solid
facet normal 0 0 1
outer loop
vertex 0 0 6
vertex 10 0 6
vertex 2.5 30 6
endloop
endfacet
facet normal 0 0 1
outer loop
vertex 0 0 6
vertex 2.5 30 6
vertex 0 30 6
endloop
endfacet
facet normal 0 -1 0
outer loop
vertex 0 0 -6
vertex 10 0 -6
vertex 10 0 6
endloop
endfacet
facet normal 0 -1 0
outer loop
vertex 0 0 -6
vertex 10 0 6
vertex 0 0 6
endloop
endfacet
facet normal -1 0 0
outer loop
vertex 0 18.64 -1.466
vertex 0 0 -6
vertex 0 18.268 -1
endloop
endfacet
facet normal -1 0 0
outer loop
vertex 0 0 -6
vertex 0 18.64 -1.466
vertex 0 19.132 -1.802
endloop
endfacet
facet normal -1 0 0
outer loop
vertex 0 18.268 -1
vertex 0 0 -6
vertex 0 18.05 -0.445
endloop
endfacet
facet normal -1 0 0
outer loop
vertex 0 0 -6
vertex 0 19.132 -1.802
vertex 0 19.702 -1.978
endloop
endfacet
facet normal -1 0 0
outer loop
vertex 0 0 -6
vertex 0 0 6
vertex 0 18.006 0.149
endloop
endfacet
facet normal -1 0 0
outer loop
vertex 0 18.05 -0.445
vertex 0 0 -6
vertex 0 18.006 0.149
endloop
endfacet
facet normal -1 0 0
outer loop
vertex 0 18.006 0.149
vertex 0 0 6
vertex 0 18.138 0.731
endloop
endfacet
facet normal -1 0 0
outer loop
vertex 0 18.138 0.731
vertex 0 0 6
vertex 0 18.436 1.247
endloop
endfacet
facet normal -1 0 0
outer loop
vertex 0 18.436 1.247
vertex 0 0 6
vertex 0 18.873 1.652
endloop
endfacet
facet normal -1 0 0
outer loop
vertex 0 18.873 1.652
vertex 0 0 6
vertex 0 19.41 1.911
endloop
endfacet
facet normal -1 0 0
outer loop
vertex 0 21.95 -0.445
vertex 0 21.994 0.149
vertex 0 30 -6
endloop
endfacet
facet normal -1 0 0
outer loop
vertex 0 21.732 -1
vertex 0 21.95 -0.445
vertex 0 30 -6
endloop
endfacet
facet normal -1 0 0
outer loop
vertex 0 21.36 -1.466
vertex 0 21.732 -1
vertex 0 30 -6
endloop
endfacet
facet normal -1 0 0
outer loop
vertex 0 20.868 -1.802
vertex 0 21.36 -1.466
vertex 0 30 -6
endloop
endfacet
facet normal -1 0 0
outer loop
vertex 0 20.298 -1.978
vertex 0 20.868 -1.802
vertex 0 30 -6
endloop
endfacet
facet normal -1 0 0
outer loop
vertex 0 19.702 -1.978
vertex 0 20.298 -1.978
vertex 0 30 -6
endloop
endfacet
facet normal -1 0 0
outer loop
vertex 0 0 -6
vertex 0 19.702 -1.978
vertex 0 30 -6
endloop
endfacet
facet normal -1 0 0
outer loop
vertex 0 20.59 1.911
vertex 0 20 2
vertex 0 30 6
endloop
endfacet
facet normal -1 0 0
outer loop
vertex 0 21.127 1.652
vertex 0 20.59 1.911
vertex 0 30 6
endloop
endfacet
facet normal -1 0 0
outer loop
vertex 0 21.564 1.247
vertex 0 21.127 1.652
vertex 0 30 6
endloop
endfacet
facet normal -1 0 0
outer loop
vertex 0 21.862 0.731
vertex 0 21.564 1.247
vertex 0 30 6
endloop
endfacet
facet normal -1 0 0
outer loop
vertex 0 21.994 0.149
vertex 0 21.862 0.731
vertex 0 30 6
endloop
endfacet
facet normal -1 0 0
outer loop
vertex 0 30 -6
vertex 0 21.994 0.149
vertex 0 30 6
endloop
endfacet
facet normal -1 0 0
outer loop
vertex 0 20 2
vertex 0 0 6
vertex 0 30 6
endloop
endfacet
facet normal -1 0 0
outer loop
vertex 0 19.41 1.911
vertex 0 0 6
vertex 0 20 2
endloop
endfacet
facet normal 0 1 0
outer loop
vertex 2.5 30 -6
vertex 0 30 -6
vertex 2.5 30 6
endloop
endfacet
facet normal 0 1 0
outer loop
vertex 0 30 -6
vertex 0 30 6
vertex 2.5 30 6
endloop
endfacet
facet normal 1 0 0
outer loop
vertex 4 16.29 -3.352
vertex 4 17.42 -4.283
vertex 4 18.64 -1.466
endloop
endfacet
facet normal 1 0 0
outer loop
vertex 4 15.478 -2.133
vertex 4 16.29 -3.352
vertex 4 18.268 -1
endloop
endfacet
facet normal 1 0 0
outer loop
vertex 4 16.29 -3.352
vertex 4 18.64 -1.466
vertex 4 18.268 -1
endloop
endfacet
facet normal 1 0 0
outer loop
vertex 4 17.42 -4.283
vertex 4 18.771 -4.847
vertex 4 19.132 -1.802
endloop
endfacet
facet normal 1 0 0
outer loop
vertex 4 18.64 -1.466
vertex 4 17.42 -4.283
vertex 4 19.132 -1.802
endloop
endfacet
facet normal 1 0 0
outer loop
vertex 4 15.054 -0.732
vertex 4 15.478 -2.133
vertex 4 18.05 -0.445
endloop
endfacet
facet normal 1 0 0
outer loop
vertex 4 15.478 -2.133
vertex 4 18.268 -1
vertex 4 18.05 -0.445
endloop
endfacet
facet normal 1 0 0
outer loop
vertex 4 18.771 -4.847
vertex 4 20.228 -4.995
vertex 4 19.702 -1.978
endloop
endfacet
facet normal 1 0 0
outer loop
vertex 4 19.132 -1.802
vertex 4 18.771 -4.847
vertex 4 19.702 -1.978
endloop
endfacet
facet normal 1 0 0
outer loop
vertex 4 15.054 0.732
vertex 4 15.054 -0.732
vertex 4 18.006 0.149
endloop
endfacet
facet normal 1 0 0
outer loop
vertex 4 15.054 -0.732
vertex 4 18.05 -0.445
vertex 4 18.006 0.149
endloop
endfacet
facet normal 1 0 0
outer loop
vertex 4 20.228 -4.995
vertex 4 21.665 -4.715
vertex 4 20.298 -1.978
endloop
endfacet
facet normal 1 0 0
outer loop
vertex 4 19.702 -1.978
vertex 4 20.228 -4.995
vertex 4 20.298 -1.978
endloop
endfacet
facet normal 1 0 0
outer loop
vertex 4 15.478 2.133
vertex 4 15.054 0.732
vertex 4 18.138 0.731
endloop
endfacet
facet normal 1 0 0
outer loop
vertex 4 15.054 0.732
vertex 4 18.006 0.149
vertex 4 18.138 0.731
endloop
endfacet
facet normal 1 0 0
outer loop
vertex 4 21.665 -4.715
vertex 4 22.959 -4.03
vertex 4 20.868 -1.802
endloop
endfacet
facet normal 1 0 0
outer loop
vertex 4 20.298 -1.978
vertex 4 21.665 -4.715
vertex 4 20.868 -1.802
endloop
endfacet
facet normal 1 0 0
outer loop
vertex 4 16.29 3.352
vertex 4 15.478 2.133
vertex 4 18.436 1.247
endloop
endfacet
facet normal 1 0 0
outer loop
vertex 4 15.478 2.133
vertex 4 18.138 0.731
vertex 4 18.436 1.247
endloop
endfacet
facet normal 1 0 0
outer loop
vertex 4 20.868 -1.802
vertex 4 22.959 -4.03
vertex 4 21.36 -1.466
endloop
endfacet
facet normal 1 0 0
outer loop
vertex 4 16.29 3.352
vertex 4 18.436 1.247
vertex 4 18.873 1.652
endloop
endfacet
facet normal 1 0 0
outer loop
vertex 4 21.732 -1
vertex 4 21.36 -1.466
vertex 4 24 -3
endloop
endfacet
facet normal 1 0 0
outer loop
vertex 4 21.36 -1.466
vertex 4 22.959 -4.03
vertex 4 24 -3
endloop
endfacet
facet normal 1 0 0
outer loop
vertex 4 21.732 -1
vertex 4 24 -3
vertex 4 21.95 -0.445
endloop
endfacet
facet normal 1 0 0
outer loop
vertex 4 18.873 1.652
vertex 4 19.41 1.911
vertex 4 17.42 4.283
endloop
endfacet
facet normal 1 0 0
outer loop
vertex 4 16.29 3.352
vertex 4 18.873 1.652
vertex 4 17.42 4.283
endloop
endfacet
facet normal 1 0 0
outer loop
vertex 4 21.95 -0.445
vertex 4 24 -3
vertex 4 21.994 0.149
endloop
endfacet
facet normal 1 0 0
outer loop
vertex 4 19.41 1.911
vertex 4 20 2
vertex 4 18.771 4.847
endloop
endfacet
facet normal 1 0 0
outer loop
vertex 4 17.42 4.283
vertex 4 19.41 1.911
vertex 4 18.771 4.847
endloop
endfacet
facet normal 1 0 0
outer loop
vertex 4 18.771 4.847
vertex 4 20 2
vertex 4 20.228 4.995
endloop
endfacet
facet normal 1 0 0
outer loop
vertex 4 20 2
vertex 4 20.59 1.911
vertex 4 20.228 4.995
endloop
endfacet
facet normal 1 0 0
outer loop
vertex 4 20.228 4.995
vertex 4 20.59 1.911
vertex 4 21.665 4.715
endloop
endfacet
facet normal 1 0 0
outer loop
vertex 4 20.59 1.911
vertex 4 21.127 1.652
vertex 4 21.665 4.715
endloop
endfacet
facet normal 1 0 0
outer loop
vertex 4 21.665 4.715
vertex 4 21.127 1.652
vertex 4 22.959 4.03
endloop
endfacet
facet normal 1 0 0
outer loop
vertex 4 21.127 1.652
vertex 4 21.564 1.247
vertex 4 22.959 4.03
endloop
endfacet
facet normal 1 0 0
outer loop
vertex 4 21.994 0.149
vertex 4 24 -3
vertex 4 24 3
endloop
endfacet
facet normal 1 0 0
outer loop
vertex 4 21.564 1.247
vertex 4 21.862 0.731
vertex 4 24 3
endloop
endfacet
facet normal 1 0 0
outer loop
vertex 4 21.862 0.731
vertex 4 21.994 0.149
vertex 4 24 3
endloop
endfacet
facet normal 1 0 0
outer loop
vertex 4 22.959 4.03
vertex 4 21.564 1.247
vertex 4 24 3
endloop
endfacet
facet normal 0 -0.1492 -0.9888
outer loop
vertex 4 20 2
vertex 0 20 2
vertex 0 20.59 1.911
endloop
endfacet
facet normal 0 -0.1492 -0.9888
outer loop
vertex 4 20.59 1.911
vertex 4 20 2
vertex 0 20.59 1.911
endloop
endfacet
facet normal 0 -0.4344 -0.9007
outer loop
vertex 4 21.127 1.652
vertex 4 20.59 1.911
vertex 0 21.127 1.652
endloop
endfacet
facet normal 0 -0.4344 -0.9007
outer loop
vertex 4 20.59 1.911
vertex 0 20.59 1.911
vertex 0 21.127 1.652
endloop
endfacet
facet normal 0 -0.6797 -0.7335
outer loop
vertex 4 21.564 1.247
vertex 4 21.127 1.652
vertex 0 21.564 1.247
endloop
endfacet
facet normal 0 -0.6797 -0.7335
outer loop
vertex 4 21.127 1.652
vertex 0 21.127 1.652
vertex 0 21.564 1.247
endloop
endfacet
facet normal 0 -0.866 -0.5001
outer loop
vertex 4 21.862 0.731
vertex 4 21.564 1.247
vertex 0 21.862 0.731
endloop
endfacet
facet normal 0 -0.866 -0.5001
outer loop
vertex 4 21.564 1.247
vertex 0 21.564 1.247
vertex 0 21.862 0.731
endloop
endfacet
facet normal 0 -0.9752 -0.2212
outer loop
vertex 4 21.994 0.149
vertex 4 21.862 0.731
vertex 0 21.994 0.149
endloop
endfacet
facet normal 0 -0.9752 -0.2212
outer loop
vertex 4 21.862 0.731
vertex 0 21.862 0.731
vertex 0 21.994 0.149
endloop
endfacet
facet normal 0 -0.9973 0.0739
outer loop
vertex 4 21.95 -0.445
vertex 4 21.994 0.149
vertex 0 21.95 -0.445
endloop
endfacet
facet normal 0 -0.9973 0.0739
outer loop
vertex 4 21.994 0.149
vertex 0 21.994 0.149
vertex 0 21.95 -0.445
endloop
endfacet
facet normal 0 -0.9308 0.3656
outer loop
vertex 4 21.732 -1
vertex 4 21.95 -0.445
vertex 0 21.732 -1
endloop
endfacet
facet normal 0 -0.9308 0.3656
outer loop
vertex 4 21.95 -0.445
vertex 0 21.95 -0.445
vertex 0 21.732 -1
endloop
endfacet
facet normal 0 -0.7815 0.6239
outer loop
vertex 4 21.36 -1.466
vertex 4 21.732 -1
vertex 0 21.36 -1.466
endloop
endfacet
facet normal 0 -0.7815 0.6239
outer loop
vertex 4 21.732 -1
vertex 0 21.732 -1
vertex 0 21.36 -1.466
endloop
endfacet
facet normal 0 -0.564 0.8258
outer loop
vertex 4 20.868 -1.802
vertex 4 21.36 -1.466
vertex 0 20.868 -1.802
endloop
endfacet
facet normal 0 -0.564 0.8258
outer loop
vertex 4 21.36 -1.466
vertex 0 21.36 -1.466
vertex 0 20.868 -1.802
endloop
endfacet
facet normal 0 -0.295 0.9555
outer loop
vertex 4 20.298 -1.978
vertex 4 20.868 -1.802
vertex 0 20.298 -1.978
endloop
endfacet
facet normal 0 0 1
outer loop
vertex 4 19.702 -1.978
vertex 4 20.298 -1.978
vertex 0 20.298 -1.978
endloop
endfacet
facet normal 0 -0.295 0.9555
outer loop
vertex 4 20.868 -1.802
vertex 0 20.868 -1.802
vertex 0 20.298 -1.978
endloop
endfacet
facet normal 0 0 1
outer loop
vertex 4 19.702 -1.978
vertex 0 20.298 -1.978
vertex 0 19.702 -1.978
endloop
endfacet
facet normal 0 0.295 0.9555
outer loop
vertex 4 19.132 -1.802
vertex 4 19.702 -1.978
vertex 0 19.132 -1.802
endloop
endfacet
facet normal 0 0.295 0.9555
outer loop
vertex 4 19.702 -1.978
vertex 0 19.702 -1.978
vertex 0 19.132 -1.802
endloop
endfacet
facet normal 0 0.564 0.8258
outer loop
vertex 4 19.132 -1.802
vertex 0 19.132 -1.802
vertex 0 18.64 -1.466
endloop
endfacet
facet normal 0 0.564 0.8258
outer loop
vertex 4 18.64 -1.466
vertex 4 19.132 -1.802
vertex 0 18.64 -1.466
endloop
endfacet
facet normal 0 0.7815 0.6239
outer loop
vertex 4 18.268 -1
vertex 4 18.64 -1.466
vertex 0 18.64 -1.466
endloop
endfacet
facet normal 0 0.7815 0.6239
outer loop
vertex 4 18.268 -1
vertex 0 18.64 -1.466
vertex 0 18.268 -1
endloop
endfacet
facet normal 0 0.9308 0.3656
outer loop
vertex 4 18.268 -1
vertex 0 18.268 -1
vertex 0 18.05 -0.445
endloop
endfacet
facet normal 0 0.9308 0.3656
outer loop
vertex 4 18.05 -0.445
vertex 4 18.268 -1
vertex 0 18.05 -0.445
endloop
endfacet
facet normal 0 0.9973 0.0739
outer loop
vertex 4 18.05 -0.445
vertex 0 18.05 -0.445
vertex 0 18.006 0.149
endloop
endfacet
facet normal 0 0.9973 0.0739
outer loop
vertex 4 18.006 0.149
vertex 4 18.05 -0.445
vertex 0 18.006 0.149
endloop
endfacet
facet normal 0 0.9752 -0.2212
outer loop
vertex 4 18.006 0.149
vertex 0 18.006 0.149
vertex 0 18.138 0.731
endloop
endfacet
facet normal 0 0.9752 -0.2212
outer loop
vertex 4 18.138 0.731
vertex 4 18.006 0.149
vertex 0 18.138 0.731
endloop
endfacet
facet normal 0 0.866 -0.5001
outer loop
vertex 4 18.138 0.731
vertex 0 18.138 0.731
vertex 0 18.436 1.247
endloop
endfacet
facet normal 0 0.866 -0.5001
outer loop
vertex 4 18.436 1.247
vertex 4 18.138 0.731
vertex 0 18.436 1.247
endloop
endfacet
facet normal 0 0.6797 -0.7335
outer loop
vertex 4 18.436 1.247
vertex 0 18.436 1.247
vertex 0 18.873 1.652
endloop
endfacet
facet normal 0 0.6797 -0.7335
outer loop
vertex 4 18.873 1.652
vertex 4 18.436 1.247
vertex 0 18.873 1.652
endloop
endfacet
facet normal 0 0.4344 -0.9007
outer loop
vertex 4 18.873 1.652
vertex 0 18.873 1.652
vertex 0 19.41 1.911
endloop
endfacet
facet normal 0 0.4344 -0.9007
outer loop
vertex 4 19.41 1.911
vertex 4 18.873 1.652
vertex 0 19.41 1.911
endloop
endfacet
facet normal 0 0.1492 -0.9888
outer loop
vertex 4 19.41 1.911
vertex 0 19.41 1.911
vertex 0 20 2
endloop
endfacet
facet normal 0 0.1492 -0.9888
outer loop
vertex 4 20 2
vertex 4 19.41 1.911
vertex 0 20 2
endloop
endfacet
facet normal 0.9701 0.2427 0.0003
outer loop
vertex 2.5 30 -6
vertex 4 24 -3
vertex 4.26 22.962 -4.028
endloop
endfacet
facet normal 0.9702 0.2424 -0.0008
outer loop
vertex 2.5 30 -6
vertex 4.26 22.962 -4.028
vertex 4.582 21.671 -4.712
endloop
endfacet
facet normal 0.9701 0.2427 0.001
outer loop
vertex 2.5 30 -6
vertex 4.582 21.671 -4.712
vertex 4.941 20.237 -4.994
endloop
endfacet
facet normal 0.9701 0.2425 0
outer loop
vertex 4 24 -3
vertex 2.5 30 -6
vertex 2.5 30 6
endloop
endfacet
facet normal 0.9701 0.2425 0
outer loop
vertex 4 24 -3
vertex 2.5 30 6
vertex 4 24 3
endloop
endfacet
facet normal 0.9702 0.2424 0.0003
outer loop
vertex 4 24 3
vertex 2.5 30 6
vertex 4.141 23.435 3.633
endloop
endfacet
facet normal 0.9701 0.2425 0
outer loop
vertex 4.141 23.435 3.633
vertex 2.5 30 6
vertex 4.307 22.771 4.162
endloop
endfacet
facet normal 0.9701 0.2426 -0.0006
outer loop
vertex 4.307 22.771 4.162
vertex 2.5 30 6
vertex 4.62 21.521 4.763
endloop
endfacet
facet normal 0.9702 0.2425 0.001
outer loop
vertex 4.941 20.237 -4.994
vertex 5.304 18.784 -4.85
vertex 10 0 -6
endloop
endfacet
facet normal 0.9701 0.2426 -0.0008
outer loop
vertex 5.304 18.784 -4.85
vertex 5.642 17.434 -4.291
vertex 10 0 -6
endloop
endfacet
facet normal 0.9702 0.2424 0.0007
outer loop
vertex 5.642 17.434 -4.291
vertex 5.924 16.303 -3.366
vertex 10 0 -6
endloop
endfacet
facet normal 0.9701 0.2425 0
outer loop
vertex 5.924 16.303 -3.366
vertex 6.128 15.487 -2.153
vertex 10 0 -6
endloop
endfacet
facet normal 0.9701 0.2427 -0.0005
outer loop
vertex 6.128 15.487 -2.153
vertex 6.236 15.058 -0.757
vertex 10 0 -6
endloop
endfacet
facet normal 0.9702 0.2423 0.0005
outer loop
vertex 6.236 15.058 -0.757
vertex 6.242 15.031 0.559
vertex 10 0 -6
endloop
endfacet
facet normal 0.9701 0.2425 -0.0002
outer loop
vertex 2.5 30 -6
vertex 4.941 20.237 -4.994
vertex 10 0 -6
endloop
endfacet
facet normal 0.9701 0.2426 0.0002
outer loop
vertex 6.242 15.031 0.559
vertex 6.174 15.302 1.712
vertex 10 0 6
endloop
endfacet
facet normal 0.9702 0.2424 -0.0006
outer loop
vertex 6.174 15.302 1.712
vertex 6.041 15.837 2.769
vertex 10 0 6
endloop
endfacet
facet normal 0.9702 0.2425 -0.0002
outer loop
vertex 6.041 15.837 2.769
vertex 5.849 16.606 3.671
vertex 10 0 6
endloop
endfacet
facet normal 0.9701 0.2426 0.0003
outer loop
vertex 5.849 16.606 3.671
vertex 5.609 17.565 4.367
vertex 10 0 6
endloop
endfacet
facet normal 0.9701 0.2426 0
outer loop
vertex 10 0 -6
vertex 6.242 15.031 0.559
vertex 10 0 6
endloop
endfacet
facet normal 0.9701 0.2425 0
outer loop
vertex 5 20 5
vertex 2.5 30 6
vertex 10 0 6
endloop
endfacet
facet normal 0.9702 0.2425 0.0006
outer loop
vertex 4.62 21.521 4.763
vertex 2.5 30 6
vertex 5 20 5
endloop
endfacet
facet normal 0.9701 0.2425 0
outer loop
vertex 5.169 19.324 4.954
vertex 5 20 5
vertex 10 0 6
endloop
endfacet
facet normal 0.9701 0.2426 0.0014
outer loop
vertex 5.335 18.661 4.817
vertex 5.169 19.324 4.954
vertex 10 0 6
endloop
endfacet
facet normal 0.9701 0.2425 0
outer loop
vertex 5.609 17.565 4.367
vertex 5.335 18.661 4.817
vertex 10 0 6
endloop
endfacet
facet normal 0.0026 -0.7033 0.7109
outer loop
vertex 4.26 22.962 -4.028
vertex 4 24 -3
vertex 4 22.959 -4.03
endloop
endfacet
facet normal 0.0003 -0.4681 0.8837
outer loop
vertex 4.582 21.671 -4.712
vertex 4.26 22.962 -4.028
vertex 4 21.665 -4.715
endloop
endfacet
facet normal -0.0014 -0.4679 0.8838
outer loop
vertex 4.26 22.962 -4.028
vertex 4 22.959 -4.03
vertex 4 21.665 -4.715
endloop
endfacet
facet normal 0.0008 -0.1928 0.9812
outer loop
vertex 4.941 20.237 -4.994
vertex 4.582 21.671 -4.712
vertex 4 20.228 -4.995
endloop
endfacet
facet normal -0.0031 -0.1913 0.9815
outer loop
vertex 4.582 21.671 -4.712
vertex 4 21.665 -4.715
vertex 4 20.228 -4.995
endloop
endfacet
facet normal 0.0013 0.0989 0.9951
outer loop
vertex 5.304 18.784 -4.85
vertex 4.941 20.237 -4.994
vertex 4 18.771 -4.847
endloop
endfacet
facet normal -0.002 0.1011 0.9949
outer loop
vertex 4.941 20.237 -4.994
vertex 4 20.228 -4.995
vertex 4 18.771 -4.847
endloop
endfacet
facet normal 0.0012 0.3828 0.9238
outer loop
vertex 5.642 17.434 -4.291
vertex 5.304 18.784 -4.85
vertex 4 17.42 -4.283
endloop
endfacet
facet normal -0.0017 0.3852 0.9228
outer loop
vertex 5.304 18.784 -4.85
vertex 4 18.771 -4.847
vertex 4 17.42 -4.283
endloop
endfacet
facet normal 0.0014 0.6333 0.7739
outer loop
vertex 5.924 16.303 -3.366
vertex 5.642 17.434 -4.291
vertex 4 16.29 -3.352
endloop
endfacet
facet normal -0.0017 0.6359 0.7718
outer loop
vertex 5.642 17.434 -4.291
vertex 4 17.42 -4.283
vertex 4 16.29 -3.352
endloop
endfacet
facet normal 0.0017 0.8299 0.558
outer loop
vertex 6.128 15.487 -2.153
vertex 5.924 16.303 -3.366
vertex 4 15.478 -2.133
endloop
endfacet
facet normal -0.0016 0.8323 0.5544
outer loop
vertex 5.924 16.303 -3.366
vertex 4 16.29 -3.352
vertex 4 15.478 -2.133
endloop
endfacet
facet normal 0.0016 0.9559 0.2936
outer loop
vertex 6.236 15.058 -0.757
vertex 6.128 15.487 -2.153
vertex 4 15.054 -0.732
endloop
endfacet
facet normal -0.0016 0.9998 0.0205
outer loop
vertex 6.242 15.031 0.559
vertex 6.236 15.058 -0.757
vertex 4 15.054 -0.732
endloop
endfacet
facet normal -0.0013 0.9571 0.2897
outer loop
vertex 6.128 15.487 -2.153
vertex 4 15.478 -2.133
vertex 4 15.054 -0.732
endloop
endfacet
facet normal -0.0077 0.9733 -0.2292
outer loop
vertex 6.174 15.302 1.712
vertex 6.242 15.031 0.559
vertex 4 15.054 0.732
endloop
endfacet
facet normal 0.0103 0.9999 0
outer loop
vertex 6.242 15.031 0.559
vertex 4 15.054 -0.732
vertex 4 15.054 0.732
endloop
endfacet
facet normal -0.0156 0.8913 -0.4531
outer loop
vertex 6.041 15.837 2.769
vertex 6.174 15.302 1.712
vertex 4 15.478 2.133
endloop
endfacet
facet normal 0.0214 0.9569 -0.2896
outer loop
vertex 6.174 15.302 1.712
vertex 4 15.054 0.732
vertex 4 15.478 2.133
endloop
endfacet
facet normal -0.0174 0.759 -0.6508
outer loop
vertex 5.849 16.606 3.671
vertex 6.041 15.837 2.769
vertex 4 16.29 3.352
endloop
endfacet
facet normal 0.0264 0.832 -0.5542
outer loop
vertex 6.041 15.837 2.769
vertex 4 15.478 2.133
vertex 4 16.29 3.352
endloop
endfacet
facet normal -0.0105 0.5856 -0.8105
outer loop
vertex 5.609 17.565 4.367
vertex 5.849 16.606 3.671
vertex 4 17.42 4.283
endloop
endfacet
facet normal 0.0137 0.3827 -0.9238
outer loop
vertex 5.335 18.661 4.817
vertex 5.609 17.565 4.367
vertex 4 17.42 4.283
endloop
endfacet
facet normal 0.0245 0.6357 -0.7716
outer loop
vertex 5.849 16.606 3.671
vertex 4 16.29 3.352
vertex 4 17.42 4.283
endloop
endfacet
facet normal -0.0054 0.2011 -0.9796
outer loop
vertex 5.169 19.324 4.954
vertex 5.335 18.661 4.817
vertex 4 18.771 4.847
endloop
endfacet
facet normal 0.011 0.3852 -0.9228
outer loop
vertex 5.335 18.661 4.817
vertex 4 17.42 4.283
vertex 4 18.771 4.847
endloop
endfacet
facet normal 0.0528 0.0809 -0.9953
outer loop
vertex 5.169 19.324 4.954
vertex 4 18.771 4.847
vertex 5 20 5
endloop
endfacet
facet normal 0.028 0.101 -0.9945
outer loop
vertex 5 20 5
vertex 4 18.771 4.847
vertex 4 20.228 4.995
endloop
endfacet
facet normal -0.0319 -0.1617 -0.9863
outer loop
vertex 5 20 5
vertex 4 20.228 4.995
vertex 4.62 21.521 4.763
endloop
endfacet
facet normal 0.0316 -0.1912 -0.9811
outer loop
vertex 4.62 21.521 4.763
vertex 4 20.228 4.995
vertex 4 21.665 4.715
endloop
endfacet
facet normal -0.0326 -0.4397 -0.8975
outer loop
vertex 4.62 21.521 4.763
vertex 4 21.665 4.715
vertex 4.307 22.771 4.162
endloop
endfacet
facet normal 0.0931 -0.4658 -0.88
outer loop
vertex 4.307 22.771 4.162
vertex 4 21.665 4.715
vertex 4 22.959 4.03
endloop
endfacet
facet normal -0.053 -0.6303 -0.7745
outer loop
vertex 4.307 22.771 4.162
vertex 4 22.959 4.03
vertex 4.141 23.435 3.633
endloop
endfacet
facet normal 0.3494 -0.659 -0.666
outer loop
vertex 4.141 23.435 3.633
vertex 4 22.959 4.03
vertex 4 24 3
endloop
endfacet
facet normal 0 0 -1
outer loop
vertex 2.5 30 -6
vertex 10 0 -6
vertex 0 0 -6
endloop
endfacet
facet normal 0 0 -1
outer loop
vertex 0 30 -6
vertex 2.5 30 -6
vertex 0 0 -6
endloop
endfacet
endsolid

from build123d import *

# Parameters (mm, degrees)
SALIENTE_EXTRUIR1_DEPTH = 6
CROQUIS3_R              = 2
CORTAR_EXTRUIR1_DEPTH   = 33.186953879
CROQUIS5_R              = 5
CORTAR_EXTRUIR2_DEPTH   = 32.176914536


with BuildPart() as part:
    # Croquis2 → Saliente-Extruir1 (new, symmetric)
    with BuildSketch(Plane.XY):
        Polygon((0, 0), (0, 30), (2.5, 30), (10, 0), align=None)
    extrude(amount=SALIENTE_EXTRUIR1_DEPTH, both=True)

    # Croquis3 → Cortar-Extruir1 (cut, through all)
    with BuildSketch(Plane.ZY):
        with Locations((0, 20)):
            Circle(CROQUIS3_R)
    extrude(amount=-CORTAR_EXTRUIR1_DEPTH, mode=Mode.SUBTRACT)

    # Croquis5 → Cortar-Extruir2 (cut, through all)
    with BuildSketch(Plane.ZY.offset(-4)):
        with Locations((0, 20)):
            Circle(CROQUIS5_R)
    extrude(amount=-CORTAR_EXTRUIR2_DEPTH, mode=Mode.SUBTRACT)


solid = part.part
